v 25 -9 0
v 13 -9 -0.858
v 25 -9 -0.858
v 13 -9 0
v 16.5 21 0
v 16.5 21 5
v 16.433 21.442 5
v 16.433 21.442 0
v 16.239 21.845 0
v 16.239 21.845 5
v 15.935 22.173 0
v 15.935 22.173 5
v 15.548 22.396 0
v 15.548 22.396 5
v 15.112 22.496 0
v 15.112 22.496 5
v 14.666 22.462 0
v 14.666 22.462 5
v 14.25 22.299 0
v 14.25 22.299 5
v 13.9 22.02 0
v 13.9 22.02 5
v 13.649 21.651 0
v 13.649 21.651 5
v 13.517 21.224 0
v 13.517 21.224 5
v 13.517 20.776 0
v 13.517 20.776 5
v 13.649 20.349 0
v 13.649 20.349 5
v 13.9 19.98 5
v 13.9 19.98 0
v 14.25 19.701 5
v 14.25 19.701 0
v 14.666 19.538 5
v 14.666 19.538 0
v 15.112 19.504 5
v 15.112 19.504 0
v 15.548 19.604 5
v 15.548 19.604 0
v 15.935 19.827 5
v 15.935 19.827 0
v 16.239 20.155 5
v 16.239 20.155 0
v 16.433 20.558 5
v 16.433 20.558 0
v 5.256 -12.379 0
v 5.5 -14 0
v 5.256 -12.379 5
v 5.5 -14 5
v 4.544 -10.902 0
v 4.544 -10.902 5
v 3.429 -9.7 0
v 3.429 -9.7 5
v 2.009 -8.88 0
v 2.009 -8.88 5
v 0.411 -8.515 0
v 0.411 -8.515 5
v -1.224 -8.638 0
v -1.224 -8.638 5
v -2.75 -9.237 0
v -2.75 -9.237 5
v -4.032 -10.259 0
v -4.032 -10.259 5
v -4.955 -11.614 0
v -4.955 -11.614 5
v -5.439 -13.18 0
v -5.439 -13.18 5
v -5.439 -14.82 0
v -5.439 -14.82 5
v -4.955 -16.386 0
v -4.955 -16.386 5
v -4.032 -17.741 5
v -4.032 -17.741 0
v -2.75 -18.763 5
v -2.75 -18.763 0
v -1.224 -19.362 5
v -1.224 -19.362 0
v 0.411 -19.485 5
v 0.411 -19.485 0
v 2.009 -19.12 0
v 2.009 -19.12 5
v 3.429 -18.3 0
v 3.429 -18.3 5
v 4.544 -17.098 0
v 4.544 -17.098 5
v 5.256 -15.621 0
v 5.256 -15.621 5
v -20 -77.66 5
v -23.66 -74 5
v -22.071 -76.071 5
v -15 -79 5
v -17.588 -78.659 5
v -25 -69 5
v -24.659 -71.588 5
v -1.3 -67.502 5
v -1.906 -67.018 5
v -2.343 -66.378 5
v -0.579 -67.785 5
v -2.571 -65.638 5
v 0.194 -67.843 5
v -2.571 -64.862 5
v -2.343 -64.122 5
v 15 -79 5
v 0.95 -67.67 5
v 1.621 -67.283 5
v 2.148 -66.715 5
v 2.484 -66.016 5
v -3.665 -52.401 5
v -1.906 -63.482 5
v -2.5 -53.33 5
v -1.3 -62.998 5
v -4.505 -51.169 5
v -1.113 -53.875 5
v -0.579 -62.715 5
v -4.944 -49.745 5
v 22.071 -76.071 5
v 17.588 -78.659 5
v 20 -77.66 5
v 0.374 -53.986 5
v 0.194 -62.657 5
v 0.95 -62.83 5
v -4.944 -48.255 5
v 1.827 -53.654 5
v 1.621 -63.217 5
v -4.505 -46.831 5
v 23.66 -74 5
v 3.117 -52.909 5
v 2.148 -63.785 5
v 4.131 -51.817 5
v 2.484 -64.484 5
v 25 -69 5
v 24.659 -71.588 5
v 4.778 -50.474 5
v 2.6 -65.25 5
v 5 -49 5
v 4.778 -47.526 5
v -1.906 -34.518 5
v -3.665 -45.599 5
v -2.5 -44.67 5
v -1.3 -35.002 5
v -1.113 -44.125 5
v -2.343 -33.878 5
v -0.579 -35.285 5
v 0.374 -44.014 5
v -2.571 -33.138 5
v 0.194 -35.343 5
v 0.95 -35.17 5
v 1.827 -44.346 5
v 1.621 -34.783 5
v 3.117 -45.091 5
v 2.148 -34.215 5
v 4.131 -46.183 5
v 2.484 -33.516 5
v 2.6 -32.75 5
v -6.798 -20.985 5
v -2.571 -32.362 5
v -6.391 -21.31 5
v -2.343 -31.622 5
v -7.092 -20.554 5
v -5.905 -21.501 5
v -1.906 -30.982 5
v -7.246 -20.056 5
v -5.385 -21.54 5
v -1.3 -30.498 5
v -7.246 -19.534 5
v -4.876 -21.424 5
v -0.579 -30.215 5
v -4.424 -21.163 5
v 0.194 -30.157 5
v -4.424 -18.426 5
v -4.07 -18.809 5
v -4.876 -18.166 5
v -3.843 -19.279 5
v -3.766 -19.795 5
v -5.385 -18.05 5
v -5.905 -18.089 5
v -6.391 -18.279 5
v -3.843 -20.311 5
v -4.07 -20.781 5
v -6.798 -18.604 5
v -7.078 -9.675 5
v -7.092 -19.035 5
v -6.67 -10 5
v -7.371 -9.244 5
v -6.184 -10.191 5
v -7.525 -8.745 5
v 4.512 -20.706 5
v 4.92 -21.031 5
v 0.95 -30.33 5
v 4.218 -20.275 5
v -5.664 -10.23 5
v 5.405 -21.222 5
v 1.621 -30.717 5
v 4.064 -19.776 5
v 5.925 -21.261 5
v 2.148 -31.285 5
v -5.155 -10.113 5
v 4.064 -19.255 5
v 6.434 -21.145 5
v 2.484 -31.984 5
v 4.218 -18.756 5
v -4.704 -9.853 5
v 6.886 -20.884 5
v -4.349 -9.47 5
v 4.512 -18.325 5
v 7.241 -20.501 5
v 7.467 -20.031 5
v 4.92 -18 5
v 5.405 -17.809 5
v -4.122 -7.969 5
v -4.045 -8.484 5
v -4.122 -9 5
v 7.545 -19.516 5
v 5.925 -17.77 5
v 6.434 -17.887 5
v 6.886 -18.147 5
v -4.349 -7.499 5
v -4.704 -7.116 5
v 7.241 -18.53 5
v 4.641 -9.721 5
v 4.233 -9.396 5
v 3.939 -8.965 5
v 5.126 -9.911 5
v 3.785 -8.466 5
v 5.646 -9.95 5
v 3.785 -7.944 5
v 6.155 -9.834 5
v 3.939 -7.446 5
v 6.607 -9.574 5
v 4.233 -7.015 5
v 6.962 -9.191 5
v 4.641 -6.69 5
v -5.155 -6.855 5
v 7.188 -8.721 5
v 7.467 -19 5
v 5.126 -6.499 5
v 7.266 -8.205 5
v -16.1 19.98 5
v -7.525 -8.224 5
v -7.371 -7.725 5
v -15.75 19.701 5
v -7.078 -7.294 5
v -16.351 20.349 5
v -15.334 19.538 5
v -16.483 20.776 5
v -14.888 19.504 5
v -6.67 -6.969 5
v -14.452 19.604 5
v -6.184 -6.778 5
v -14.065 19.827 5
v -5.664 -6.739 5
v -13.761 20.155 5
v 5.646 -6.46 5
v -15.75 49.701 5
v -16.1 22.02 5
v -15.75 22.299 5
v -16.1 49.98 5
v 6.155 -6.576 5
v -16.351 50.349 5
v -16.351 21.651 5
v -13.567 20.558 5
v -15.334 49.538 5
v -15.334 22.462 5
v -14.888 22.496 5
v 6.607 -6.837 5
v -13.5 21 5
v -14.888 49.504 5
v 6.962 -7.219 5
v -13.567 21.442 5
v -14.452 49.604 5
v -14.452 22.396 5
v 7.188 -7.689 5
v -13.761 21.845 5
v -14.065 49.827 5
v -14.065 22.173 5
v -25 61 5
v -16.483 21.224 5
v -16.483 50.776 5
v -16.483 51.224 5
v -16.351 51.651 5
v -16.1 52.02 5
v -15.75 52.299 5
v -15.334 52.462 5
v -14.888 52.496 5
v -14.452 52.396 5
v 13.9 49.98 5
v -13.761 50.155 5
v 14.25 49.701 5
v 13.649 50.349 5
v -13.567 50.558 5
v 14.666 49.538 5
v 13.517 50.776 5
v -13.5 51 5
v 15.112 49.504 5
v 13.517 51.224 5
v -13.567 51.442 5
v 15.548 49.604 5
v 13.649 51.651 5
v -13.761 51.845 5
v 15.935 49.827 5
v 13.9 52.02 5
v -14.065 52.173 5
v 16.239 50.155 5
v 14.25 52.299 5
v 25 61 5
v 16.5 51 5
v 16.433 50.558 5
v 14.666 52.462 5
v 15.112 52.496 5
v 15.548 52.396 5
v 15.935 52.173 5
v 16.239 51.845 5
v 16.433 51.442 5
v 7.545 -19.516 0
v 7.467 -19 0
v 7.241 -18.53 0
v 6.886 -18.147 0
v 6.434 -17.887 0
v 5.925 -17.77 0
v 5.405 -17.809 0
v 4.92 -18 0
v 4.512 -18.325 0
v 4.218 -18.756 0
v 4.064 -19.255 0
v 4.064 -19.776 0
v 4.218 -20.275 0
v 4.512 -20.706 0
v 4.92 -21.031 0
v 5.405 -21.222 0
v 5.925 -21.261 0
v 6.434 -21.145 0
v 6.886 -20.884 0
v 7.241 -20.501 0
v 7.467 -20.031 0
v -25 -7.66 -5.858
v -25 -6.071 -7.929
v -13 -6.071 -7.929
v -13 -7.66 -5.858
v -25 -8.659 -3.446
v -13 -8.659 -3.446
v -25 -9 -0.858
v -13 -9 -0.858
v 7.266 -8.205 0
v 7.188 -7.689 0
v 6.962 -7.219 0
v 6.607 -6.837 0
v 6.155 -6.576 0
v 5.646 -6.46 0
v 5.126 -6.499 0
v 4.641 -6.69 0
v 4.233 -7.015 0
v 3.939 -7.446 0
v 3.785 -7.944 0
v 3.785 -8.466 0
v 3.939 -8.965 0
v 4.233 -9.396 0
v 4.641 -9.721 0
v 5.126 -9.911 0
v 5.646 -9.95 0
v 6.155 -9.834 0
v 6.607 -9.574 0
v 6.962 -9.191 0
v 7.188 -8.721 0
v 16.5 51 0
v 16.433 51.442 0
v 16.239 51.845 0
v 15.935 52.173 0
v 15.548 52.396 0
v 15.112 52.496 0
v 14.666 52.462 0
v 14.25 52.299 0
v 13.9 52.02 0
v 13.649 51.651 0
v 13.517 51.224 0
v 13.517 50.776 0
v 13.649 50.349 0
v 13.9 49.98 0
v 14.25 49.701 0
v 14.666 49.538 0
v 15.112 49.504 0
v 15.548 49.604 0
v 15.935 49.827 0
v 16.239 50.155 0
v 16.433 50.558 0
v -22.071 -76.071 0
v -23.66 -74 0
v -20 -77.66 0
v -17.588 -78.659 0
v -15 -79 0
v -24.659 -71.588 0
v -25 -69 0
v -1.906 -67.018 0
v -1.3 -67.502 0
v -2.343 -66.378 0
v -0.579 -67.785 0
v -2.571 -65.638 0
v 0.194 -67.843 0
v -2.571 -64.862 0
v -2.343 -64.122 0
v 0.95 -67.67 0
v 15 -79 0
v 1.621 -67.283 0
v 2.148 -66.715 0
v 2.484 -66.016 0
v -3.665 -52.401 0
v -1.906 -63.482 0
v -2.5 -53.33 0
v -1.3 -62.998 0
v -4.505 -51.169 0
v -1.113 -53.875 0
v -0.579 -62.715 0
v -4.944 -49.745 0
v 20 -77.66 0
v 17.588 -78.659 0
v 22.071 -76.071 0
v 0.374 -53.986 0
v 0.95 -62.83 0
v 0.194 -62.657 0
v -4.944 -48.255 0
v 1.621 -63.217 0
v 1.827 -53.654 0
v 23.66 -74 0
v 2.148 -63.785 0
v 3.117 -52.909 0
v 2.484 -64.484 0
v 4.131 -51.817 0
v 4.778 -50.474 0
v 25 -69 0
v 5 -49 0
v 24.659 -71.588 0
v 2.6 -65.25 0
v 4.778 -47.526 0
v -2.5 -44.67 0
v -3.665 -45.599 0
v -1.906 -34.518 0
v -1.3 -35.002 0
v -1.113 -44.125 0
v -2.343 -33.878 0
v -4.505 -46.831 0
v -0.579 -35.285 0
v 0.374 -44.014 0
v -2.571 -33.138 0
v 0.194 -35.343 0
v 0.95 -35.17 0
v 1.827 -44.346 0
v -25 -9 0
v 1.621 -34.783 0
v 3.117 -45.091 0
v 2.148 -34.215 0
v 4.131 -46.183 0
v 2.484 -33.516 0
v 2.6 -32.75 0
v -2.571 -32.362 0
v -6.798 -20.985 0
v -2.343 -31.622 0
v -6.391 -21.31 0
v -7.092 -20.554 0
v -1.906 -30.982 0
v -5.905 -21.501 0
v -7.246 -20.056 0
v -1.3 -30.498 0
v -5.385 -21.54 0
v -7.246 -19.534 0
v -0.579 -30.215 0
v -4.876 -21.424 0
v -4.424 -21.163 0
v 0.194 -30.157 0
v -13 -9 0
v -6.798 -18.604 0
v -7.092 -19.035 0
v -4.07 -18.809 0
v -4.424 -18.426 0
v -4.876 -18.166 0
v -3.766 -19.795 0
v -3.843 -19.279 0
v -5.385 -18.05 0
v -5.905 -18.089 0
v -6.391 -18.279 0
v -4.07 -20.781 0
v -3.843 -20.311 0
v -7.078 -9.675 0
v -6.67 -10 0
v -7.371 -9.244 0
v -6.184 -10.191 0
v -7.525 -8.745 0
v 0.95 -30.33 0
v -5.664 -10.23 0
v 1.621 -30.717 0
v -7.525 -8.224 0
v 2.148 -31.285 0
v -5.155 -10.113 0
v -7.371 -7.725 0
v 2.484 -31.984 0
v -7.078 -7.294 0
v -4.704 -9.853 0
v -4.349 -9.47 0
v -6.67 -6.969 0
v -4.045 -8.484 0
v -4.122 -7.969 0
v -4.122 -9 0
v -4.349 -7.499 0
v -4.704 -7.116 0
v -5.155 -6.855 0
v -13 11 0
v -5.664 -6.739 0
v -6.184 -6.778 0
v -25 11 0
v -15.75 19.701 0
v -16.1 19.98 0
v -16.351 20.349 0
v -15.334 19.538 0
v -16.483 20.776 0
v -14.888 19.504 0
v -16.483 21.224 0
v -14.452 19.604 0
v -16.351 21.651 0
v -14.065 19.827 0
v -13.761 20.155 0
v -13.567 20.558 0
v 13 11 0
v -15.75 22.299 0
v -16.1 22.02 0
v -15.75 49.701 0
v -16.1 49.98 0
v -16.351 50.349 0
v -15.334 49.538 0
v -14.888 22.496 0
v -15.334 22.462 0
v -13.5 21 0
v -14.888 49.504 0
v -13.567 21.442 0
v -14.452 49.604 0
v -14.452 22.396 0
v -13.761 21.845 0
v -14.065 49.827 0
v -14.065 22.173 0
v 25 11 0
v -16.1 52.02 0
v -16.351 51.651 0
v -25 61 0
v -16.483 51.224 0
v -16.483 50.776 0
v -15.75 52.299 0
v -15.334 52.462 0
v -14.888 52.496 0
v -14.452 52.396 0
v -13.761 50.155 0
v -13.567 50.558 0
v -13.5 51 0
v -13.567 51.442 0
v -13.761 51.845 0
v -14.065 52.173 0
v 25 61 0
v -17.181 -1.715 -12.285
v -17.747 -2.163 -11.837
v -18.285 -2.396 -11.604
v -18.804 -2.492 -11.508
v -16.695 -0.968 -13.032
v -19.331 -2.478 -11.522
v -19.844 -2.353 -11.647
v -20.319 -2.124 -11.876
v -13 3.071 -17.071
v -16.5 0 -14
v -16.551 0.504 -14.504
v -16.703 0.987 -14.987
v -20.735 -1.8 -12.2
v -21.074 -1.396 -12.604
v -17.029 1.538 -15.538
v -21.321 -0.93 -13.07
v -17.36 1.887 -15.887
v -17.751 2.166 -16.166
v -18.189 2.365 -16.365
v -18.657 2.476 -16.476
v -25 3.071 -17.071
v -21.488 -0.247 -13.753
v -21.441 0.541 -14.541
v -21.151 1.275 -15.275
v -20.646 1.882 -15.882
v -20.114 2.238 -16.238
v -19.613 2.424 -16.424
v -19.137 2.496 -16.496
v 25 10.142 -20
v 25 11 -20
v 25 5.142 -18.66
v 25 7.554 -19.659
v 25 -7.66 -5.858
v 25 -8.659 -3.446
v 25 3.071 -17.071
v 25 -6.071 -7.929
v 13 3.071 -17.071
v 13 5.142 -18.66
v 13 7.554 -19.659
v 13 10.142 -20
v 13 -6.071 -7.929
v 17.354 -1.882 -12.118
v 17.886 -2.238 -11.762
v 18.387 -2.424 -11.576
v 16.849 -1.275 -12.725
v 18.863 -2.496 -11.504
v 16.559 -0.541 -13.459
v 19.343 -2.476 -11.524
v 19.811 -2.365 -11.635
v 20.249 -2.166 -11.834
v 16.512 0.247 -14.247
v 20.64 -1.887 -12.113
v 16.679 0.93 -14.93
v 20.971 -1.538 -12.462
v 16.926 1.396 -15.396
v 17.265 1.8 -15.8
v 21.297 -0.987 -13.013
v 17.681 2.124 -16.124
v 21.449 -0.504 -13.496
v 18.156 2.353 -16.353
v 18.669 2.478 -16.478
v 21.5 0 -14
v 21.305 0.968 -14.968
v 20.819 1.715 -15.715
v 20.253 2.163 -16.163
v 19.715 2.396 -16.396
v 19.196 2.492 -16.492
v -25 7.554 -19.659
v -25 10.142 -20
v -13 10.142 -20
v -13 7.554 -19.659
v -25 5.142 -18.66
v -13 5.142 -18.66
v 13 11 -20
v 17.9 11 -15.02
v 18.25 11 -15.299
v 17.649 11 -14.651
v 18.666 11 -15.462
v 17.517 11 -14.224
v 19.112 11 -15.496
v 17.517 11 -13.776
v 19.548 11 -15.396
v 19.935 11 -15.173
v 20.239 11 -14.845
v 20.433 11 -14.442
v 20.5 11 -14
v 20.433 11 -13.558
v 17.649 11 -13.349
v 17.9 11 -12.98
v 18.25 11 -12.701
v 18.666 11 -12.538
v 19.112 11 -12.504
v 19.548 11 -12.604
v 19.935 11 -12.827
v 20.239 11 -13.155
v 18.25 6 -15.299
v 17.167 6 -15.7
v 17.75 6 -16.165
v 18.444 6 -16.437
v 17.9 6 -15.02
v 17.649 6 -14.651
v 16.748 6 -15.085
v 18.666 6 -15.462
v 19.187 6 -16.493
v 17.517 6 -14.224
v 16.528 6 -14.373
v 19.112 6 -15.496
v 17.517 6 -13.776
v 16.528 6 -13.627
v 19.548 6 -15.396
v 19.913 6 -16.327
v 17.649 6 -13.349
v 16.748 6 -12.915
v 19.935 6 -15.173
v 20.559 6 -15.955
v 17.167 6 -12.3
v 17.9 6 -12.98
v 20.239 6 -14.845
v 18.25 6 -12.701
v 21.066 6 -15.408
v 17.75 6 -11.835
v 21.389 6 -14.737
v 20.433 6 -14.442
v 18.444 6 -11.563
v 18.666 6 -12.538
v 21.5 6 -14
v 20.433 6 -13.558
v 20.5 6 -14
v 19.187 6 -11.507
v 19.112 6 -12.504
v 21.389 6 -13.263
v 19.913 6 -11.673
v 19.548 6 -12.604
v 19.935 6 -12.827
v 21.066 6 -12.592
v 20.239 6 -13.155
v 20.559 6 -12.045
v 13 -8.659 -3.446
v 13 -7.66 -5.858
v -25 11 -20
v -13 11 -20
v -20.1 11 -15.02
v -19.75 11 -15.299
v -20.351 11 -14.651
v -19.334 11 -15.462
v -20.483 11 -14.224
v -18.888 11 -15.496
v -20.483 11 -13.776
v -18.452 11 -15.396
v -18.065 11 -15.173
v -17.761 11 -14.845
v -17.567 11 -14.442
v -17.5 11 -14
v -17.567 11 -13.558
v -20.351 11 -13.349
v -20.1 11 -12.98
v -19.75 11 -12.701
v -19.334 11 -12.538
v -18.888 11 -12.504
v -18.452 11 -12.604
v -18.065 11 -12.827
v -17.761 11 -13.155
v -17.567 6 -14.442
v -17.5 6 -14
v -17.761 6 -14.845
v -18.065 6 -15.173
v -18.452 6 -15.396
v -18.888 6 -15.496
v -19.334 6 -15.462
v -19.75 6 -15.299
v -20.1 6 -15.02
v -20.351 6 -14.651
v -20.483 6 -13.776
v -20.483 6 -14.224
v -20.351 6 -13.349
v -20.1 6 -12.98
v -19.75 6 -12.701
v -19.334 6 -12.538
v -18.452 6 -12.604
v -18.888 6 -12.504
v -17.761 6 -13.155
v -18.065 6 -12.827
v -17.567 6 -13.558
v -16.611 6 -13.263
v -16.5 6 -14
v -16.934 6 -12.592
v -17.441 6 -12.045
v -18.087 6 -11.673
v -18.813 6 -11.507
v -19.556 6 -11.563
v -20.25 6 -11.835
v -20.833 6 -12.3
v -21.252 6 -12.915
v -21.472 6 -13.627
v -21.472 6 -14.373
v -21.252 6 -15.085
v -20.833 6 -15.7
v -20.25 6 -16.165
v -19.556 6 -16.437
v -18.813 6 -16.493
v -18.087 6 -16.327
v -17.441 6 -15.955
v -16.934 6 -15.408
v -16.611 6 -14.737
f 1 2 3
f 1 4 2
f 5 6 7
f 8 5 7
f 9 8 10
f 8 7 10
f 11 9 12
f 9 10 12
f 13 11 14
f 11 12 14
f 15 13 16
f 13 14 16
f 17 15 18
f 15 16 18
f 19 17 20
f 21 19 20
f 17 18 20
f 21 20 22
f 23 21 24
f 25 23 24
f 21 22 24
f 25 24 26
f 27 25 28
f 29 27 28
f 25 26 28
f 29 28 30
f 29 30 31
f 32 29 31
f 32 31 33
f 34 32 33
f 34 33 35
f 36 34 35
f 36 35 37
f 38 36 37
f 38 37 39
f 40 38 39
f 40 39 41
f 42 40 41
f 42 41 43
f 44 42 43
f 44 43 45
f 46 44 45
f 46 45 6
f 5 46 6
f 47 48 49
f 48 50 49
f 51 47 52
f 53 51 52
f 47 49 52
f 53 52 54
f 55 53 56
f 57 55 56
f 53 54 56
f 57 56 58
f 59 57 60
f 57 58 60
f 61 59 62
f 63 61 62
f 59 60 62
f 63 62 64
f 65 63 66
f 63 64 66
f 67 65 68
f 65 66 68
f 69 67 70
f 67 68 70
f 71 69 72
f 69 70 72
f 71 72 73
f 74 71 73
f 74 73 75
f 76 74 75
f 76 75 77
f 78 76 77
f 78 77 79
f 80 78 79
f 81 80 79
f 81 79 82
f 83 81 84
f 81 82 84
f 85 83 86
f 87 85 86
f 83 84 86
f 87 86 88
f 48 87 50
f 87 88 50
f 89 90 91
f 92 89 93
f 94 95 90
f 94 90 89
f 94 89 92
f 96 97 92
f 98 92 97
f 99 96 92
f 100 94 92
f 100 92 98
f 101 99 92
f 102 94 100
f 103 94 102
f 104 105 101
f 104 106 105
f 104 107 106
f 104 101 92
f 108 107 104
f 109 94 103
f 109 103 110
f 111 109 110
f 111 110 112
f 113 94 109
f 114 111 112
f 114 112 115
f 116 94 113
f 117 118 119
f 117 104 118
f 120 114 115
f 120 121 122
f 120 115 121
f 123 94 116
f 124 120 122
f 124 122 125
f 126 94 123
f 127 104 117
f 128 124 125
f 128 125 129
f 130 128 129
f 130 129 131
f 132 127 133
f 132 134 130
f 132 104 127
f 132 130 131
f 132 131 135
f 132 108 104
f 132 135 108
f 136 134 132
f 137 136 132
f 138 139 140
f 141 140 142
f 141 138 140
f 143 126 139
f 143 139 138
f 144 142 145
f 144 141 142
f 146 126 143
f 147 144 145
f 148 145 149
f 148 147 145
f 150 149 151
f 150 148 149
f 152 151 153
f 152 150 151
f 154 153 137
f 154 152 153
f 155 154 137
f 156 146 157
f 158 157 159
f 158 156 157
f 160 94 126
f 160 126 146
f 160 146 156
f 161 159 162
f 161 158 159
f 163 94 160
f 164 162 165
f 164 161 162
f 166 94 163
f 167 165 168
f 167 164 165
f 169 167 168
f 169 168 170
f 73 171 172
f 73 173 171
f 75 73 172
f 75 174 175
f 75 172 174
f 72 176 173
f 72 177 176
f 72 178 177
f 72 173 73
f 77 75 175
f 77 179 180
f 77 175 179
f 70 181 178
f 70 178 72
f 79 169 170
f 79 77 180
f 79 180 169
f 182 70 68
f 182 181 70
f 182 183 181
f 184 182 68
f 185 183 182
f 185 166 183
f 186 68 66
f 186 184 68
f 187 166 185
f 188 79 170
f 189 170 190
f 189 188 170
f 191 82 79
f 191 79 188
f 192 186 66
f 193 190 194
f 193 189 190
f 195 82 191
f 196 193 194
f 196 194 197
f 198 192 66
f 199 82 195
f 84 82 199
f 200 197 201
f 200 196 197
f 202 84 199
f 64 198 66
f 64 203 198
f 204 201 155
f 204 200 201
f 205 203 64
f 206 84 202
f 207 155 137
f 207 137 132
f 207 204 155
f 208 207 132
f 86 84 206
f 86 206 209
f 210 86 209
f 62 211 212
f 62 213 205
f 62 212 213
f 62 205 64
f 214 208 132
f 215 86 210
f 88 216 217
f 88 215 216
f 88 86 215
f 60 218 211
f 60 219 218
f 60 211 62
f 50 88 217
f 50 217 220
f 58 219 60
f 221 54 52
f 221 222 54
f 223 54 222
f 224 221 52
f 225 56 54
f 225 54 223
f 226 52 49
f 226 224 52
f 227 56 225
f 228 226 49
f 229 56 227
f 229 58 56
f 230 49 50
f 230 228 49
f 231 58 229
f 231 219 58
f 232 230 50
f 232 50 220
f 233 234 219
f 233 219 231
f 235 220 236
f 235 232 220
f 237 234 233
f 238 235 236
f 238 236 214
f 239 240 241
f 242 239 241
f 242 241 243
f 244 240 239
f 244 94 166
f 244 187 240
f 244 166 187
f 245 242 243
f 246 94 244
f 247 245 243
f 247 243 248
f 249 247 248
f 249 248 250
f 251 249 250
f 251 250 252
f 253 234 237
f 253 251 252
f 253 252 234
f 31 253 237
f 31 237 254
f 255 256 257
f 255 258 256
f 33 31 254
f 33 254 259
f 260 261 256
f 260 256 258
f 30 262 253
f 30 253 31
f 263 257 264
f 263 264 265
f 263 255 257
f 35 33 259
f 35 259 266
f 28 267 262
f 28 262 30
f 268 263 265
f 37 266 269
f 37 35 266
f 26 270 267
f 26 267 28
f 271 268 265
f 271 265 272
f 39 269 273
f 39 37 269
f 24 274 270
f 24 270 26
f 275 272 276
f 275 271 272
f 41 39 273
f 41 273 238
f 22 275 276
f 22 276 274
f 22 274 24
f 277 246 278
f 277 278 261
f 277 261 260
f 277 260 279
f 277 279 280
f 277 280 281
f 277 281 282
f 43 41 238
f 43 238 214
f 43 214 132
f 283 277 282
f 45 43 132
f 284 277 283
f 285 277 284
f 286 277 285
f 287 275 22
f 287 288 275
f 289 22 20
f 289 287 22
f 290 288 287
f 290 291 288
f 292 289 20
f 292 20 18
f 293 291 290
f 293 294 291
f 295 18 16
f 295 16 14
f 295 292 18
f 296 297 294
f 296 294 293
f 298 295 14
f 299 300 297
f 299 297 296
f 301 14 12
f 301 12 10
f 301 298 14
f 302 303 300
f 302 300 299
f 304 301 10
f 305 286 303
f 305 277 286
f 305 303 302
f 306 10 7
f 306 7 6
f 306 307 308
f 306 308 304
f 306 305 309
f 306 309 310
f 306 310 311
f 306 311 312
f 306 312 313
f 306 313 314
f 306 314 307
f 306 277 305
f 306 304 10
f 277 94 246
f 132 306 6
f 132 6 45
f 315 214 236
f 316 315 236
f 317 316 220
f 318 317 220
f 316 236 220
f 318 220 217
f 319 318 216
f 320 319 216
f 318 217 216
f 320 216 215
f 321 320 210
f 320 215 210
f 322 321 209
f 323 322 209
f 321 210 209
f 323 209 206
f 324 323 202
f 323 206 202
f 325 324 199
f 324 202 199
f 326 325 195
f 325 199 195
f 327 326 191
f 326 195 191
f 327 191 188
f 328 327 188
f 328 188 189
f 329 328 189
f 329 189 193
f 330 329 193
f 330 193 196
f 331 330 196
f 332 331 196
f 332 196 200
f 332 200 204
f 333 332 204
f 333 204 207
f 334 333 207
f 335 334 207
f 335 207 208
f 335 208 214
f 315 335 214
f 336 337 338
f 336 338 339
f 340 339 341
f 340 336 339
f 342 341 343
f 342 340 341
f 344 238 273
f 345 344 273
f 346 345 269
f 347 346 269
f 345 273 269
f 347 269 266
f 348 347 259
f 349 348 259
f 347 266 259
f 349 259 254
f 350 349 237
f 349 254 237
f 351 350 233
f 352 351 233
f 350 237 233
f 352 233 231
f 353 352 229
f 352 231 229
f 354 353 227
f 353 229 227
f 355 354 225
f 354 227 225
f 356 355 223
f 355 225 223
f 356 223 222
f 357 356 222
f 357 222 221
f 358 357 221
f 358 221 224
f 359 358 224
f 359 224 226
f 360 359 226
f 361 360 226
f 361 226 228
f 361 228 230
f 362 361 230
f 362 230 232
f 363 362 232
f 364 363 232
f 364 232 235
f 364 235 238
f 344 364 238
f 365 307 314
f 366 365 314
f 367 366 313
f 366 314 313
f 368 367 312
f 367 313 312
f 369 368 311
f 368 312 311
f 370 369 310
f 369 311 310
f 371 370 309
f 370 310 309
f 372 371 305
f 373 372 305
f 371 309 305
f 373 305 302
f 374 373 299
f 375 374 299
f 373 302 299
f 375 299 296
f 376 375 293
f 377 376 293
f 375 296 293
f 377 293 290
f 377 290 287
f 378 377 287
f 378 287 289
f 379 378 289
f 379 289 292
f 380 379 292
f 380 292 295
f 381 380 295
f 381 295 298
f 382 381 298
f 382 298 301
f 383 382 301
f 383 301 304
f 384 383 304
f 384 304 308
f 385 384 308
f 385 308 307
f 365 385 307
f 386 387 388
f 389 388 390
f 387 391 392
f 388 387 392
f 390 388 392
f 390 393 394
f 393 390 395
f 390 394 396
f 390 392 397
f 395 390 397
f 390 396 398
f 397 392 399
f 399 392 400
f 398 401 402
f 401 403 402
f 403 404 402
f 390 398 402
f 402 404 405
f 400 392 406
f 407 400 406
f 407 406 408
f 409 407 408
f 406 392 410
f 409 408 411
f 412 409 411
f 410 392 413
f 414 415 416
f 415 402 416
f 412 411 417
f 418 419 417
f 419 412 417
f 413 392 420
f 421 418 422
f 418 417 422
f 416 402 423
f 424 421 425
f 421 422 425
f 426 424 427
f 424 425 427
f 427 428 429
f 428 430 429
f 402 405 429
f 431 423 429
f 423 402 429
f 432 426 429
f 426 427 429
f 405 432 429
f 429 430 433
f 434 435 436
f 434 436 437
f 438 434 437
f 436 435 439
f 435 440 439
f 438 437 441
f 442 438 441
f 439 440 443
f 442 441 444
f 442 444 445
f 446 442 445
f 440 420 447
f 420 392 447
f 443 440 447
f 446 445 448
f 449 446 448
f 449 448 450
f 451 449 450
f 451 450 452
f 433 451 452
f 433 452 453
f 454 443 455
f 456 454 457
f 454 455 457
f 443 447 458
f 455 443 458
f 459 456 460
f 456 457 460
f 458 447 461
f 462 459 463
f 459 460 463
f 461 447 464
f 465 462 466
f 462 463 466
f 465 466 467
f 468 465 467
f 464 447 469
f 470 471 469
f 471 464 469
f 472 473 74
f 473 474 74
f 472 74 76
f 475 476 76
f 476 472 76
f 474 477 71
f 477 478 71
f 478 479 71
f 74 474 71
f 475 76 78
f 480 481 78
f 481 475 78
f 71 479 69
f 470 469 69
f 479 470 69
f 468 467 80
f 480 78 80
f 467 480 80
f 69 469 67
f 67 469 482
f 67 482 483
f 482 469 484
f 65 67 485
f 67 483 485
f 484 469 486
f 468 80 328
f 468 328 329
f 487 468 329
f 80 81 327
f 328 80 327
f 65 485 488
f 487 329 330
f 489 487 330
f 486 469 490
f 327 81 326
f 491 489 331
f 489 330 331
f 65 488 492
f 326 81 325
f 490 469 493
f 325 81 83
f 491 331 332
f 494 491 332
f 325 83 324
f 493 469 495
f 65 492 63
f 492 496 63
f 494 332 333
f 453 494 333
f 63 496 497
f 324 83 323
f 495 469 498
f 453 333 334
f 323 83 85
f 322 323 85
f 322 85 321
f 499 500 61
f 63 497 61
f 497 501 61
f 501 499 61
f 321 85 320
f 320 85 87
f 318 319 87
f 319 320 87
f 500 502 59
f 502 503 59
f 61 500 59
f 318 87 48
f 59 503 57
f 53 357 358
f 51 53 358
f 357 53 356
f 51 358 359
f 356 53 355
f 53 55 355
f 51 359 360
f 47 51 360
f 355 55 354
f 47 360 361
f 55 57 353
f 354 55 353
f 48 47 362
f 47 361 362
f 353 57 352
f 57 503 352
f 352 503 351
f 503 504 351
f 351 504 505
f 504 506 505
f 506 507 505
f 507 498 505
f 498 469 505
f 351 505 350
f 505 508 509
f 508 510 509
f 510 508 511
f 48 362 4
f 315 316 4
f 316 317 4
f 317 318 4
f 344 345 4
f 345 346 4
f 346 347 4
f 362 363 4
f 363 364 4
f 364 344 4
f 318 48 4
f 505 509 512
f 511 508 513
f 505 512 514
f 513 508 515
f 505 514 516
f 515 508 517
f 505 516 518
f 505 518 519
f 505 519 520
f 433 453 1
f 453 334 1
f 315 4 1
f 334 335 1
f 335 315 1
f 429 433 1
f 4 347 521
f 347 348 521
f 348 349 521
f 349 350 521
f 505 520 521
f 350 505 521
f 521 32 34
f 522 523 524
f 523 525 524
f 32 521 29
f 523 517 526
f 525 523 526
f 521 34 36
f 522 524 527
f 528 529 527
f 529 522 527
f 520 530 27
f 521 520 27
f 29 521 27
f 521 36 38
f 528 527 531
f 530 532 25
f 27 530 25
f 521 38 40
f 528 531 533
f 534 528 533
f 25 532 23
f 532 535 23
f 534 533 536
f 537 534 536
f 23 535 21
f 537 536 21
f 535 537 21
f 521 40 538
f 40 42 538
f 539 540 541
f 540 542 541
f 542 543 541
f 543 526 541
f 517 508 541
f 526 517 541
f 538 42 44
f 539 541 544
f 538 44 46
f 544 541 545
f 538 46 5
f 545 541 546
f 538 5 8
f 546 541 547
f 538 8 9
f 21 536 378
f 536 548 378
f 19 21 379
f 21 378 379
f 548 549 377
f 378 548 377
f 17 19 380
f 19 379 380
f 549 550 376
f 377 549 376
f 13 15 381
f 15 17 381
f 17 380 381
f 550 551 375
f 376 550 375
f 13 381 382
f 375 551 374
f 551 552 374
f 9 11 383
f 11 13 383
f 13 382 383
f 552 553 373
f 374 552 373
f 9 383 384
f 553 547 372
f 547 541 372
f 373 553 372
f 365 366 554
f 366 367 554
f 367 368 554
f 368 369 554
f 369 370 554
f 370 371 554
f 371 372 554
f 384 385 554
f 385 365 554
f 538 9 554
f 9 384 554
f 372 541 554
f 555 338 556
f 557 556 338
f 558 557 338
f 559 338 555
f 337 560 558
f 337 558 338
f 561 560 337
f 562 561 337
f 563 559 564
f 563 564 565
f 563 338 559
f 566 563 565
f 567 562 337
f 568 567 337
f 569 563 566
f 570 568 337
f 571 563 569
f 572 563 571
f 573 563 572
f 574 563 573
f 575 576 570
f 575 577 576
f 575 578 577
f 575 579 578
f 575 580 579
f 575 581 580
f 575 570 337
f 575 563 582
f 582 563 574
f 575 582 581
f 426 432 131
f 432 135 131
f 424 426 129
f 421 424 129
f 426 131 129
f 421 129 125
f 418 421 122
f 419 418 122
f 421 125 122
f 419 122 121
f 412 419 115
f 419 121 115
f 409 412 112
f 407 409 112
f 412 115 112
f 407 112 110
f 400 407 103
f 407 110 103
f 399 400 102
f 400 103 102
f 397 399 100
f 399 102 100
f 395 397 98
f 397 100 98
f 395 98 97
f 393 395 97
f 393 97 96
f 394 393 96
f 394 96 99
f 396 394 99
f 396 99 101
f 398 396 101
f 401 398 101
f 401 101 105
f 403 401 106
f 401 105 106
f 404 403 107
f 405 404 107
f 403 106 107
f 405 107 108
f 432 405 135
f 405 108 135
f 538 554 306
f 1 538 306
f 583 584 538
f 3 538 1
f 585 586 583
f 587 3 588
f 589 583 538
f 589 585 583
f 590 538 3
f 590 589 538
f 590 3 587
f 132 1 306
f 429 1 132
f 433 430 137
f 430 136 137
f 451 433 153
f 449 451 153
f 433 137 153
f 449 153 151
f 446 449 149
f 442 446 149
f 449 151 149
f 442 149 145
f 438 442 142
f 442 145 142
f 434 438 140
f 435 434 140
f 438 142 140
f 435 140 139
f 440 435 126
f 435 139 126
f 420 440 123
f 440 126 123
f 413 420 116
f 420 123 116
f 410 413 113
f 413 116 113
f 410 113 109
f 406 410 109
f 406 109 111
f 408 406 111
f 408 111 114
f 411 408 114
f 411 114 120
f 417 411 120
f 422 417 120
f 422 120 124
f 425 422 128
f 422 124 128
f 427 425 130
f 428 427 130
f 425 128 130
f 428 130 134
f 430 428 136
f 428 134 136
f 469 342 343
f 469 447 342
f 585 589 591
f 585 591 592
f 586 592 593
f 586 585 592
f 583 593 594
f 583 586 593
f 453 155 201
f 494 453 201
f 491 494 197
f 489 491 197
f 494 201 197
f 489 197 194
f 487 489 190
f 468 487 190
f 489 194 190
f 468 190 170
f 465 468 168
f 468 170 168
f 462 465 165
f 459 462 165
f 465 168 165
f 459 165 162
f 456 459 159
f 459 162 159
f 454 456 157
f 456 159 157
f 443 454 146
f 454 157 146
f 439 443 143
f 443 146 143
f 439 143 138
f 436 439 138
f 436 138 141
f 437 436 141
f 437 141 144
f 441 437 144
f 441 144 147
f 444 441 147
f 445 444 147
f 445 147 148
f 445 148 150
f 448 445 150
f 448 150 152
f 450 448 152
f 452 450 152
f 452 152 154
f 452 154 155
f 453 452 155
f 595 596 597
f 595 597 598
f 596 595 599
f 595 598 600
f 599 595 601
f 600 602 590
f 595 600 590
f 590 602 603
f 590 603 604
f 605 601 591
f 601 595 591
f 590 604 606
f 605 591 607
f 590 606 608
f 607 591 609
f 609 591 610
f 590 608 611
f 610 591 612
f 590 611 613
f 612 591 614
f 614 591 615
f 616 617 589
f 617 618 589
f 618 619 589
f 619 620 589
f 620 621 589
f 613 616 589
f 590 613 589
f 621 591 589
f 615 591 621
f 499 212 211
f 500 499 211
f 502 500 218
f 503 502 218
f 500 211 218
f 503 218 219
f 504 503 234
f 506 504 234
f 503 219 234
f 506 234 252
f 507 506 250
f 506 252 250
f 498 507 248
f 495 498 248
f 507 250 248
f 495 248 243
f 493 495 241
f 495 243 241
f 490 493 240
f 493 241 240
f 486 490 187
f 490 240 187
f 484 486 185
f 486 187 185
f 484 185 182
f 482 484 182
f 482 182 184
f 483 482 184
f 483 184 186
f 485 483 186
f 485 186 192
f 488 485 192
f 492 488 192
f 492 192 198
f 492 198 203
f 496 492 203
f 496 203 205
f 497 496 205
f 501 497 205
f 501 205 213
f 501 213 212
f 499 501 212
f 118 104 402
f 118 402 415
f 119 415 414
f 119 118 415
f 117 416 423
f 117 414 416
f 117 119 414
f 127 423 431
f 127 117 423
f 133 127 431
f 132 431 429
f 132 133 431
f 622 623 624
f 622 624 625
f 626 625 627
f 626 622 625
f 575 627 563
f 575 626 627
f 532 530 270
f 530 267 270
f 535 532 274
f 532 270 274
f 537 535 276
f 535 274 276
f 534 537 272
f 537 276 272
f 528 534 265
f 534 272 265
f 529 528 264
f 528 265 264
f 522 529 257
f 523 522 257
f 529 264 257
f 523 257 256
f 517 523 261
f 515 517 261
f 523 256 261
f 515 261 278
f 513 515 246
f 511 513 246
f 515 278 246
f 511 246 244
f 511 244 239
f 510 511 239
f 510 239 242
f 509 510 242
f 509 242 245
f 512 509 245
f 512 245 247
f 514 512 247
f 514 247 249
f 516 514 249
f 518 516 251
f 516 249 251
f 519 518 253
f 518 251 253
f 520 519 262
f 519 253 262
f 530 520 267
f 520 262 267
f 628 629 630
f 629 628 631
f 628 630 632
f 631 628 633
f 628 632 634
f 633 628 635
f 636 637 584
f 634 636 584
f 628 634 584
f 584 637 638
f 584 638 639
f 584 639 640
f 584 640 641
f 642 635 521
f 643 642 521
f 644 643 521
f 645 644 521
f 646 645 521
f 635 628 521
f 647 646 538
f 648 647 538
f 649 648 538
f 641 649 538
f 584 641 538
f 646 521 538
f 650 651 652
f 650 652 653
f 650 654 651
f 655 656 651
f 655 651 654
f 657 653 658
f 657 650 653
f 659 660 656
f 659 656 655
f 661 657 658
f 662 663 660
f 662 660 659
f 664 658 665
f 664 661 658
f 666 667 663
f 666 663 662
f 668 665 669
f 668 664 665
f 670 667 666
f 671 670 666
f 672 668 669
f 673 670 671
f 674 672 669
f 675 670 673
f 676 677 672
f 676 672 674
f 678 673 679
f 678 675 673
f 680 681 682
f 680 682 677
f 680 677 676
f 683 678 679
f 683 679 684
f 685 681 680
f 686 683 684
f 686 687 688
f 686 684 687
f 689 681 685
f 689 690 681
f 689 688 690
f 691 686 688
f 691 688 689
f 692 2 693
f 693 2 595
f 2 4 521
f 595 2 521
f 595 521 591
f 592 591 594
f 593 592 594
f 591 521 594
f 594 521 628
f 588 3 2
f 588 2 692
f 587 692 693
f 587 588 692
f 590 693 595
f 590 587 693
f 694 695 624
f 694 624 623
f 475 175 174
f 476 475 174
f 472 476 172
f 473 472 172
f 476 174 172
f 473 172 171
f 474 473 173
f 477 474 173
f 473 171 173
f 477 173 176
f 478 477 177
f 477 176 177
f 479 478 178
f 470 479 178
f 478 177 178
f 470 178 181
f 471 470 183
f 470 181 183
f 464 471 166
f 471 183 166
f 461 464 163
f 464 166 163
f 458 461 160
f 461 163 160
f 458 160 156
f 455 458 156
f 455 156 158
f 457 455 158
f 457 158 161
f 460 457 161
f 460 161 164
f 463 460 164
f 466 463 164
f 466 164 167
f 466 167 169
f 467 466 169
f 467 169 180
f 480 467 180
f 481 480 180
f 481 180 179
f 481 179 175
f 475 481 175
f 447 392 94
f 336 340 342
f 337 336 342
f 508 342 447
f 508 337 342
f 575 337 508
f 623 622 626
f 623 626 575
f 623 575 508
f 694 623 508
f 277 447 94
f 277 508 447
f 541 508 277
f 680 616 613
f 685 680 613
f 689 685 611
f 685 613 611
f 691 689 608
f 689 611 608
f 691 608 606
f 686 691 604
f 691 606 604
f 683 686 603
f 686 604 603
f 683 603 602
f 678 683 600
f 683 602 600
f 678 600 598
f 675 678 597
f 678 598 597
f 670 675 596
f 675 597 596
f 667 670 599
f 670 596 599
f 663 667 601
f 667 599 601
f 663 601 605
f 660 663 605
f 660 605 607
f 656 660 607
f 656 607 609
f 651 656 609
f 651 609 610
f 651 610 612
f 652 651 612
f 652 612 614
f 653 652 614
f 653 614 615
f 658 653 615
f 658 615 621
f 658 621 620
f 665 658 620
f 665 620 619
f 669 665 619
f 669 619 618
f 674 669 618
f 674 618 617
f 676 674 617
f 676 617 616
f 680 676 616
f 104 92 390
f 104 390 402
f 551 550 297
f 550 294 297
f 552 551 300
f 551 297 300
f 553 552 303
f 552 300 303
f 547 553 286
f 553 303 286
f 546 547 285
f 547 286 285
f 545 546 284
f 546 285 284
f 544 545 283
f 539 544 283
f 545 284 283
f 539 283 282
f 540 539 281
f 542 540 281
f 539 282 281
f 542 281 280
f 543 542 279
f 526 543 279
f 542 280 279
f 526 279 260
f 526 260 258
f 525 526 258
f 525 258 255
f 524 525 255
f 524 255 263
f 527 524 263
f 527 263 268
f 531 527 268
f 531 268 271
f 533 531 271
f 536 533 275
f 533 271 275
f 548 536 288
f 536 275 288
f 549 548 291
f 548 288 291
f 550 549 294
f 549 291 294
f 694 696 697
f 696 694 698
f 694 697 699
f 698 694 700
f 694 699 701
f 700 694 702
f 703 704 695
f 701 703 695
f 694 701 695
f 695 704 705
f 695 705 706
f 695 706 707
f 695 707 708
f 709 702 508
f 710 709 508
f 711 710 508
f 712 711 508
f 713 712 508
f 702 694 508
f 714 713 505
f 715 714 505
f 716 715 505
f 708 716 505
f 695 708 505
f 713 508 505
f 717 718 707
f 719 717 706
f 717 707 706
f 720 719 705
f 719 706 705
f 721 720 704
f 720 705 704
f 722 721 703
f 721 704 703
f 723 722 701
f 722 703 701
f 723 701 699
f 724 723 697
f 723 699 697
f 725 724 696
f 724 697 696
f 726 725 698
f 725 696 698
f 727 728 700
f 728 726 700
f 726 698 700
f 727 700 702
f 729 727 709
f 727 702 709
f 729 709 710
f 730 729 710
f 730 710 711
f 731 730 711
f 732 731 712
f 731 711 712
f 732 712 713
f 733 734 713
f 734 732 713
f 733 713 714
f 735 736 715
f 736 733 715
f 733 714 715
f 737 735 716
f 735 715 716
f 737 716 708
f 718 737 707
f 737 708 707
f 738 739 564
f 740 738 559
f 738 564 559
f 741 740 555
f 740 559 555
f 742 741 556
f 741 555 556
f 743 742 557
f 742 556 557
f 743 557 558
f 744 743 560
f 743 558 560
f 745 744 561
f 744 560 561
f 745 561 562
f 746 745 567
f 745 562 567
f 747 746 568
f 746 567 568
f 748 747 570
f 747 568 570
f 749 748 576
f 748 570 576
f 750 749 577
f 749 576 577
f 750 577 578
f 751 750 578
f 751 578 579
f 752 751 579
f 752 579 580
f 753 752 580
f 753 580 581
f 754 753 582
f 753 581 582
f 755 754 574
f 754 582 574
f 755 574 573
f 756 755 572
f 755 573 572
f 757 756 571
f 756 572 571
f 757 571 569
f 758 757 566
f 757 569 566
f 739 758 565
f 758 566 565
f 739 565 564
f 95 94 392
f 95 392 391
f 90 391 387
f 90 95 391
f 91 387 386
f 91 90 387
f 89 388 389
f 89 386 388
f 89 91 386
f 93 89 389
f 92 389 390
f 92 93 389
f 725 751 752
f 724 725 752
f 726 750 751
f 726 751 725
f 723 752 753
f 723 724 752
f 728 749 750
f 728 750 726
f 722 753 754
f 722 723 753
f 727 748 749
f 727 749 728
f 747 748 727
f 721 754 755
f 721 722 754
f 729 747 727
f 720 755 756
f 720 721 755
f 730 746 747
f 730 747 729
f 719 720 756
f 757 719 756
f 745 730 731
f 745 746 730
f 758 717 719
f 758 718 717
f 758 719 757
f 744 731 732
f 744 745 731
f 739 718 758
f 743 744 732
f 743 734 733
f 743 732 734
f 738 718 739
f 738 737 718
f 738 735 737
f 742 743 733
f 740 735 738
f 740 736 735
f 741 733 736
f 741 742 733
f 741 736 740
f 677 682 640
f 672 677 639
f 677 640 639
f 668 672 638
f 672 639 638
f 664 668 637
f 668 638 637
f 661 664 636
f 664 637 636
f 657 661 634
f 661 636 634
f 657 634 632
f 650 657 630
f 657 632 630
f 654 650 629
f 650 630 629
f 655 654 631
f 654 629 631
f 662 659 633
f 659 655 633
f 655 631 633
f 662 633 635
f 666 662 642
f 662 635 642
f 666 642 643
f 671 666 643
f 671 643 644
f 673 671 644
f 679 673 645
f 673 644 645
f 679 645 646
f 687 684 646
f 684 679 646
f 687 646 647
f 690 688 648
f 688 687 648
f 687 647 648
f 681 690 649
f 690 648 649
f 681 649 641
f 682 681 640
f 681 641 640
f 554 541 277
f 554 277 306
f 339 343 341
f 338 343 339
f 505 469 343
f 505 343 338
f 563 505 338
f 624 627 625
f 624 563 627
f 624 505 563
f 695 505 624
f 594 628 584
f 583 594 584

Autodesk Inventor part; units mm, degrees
ref_plane "YZ Plane" through (0, 0, 0) normal (1, 0, 0) x (0, 1, 0)
ref_plane "XZ Plane" through (0, 0, 0) normal (0, 1, 0) x (-1, 0, 0)
ref_plane "XY Plane" through (0, 0, 0) normal (0, 0, 1) x (1, 0, 0)
sketch "Sketch1" plane through (0, 0, 0) normal (0, 0, 1) x (1, 0, 0)
  line L0 (25, 11) -> (-25, 11) projected
  line L1 (-25, 61) -> (25, 61)
  line L2 (25, 61) -> (25, -39)
  line L3 (25, -39) -> (-25, -39)
  line L4 (-25, -39) -> (-25, 61)
  line L5 (-25, 61) -> (25, -39) construction
  line L6 (25, 61) -> (-25, -39) construction
  line L7 (25, -39) -> (-25, -39)
  line L8 (-25, -39) -> (-25, -89)
  line L9 (-25, -89) -> (25, -89)
  line L10 (25, -89) -> (25, -39)
  point P0 (0, 0)
  point P1 (0, 11)
  dimension "d0" = 50
  dimension "d1" = 100
  dimension "d2" = 50
  dimension "d3" = 50
extrude "Extrusion1" add sketch "Sketch1" along normal blind 5
fillet "Fillet1" radius 10 2 edges at (25, -89, 2.5) (-25, -89, 2.5)
ref_plane "Work Plane1" through (-15, 11, 0) normal (0, -1, 0) x (1, 0, 0)
sketch "Sketch2" plane through (-15, 11, 0) normal (0, -1, 0) x (1, 0, 0)
  line L0 (40, -0.5) -> (-10, -0.5) projected
  line L1 (-10, -0.5) -> (-10, -3.5) projected
  line L2 (40, -3.5) -> (-10, -3.5) projected
  line L3 (40, -0.5) -> (40, -3.5) projected
  line L4 (-10, -3.5) -> (40, -3.5) projected
  line L5 (-10, -3.5) -> (-10, -53.5) projected
  line L6 (-10, -53.5) -> (40, -53.5) projected
  line L7 (40, -53.5) -> (40, -3.5) projected
  line L8 (40, -3.5) -> (-10, -3.5) projected
  ellipse E0 centre (15, -28.5) end of major axis (18.5, -28.5) minor radius 3.5 projected
  line L9 (-10, 0) -> (0, 0) projected
  line L10 (40, 0) -> (-10, 0) projected
  line L11 (30, 0) -> (40, 0) projected
  line L12 (0, 0) -> (30, 0) projected
  line L13 (25, -0.5) -> (5, -0.5) projected
  line L14 (5, -0.5) -> (5, -20.5) projected
  line L15 (25, -20.5) -> (5, -20.5) projected
  line L16 (25, -0.5) -> (25, -20.5) projected
  line L17 (40, 0) -> (28, 0)
  line L18 (28, 0) -> (28, -20)
  line L19 (28, -20) -> (40, -20)
  line L20 (40, -20) -> (40, 0)
  line L21 (-10, 0) -> (2, 0)
  line L22 (2, 0) -> (2, -20)
  line L23 (2, -20) -> (-10, -20)
  line L24 (-10, -20) -> (-10, 0)
  point P0 (15, 0)
  dimension "d8" = 12
  dimension "d9" = 20
  dimension "d10" = 12
  dimension "d11" = 20
extrude "Extrusion2" add sketch "Sketch2" along normal blind 20 contours L18 L10 L20 L0 | L0 L3 L2 L18 | L22 L2 L1 L0 | L0 L24 L9 L10 L22 | L2 L7 L19 L18 | L22 L23 L5 L2
chamfer "Chamfer1" distance 15 angle 45 2 edges at (-19, -9, -20) (19, -9, -20)
fillet "Fillet2" radius 10 2 edges at (-19, 6, -20) (-19, -9, -5)
fillet "Fillet3" radius 10 2 edges at (19, -9, -5) (19, 6, -20)
sketch "Sketch3" plane through (0, 0, 5) normal (0, 0, 1) x (1, 0, 0)
  line L0 (25, -79) -> (25, 61) projected
  line L1 (-25, 61) -> (-25, -79) projected
  line L2 (25, 61) -> (-25, 61)
  line L3 (-25, 61) -> (-25, 11)
  line L4 (-25, 11) -> (25, 11)
  line L5 (25, 11) -> (25, 61)
  line L6 (-15, 51) -> (15, 51)
  line L7 (15, 51) -> (15, 21)
  line L8 (15, 21) -> (-15, 21)
  line L9 (-15, 21) -> (-15, 51)
  line L10 (-15, 51) -> (15, 21) construction
  line L11 (15, 51) -> (-15, 21) construction
  circle A0 centre (15, 21) radius 1.5
  circle A1 centre (15, 51) radius 1.5
  circle A2 centre (-15, 51) radius 1.5
  circle A3 centre (-15, 21) radius 1.5
  point P0 (0, 0)
  point P1 (0, 36)
  dimension "d19" = 50
  dimension "d20" = 30
  dimension "d21" = 30
  dimension "d22" = 3
  dimension "d23" = 3
  dimension "d24" = 3
  dimension "d25" = 3
extrude "Extrusion3" cut sketch "Sketch3" against normal blind 20 contours L9 A2 L6 | L6 A2 L9 | A1 L7 L6 | L6 L7 A1 | A3 L8 L9 | L9 L8 A3 | A0 L8 L7 | L7 L8 A0
sketch "Sketch4" plane through (-15, 11, 0) normal (0, 1, 0) x (1, 0, 0)
  line L0 (-10, 0) -> (-10, 20) projected
  line L1 (-10, 20) -> (2, 20)
  line L2 (2, 20) -> (2, 8)
  line L3 (2, 8) -> (-10, 8)
  line L4 (-10, 8) -> (-10, 20)
  circle A0 centre (-4, 14) radius 1.5
  circle A1 centre (34, 14) radius 1.5
  point P0 (15, 0)
  dimension "d28" = 12
  dimension "d29" = 12
  dimension "d30" = 3
  dimension "d33" = 38
extrude "Extrusion4" cut sketch "Sketch4" against normal through all contours A0 | A1
sketch "Sketch5" plane through (-15, -9, 0) normal (0, -1, 0) x (1, 0, 0)
  circle A0 centre (34, -14) radius 1.5 projected
  circle A1 centre (-4, -14) radius 1.5 projected
  circle A2 centre (34, -14) radius 2.5
  circle A3 centre (-4, -14) radius 1.5 projected
  circle A4 centre (-4, -14) radius 2.5
  point P0 (15, 0)
  dimension "d40" = 5
  dimension "d41" = 5
extrude "Extrusion5" cut sketch "Sketch5" against normal blind 15
sketch "Sketch6" plane through (0, 0, 5) normal (0, 0, 1) x (1, 0, 0)
  circle A0 centre (0, -49) radius 5
  line L0 (25, 61) -> (-25, 61) projected
  circle A1 centre (0, -32.75) radius 2.6
  circle A2 centre (0, -65.25) radius 2.6
  circle A3 centre (0, -14) radius 5.5
  point P0 (0, 0)
  dimension "d44" = 10
  dimension "d45" = 110
  dimension "d46" = 5.2
  dimension "d47" = 5.2
  dimension "d48" = 16.25
  dimension "d49" = 16.25
  dimension "d52" = 11
  dimension "d53" = 75
extrude "Extrusion6" cut sketch "Sketch6" against normal blind 10
sketch "Sketch7" plane through (0, 0, 5) normal (0, 0, 1) x (1, 0, 0)
  circle A0 centre (-5.7947, -8.4844) radius 1.75
  circle A1 centre (-5.5156, -19.7947) radius 1.75
  circle A2 centre (5.7947, -19.5156) radius 1.75
  circle A3 centre (5.5156, -8.2053) radius 1.75
  point P0 (0, 0)
extrude "Extrusion7" cut sketch "Sketch7" against normal through all
sketch "Sketch8" plane through (0, 0, 5) normal (0, 0, 1) x (1, 0, 0)
  line L0 (-25, 61) -> (-25, -79) projected
  arc A0 (15, -89) -> (25, -79) centre (15, -79) ccw projected
  line L1 (-25, -79) -> (25, -79)
  circle A1 centre (5.7947, -19.5156) radius 1.75 projected
  circle A2 centre (-5.5156, -19.7947) radius 1.75 projected
  circle A3 centre (5.5156, -8.2053) radius 1.75 projected
  circle A4 centre (-5.7947, -8.4844) radius 1.75 projected
  circle A5 centre (0, -32.75) radius 2.6 projected
  circle A6 centre (0, -49) radius 5 projected
  circle A7 centre (0, -65.25) radius 2.6 projected
  circle A8 centre (0, -14) radius 5.5 projected
  circle A9 centre (-15, 21) radius 1.5 projected
  circle A10 centre (15, 21) radius 1.5 projected
  circle A11 centre (-15, 51) radius 1.5 projected
  circle A12 centre (15, 51) radius 1.5 projected
  arc A13 (-25, -79) -> (-15, -89) centre (-15, -79) ccw projected
  line L2 (-15, -89) -> (15, -89) projected
  arc A14 (15, -89) -> (25, -79) centre (15, -79) ccw projected
  line L3 (25, -79) -> (25, 61) projected
  line L4 (25, 61) -> (-25, 61) projected
  line L5 (-25, 61) -> (-25, -79) projected
  point P0 (0, 0)
extrude "Extrusion8" cut sketch "Sketch8" against normal blind 10 contours L1 A0 L2 A13
fillet "Fillet4" radius 10 2 edges at (25, -79, 2.5) (-25, -79, 2.5)
properties part number "3d mount for linear bearing"
